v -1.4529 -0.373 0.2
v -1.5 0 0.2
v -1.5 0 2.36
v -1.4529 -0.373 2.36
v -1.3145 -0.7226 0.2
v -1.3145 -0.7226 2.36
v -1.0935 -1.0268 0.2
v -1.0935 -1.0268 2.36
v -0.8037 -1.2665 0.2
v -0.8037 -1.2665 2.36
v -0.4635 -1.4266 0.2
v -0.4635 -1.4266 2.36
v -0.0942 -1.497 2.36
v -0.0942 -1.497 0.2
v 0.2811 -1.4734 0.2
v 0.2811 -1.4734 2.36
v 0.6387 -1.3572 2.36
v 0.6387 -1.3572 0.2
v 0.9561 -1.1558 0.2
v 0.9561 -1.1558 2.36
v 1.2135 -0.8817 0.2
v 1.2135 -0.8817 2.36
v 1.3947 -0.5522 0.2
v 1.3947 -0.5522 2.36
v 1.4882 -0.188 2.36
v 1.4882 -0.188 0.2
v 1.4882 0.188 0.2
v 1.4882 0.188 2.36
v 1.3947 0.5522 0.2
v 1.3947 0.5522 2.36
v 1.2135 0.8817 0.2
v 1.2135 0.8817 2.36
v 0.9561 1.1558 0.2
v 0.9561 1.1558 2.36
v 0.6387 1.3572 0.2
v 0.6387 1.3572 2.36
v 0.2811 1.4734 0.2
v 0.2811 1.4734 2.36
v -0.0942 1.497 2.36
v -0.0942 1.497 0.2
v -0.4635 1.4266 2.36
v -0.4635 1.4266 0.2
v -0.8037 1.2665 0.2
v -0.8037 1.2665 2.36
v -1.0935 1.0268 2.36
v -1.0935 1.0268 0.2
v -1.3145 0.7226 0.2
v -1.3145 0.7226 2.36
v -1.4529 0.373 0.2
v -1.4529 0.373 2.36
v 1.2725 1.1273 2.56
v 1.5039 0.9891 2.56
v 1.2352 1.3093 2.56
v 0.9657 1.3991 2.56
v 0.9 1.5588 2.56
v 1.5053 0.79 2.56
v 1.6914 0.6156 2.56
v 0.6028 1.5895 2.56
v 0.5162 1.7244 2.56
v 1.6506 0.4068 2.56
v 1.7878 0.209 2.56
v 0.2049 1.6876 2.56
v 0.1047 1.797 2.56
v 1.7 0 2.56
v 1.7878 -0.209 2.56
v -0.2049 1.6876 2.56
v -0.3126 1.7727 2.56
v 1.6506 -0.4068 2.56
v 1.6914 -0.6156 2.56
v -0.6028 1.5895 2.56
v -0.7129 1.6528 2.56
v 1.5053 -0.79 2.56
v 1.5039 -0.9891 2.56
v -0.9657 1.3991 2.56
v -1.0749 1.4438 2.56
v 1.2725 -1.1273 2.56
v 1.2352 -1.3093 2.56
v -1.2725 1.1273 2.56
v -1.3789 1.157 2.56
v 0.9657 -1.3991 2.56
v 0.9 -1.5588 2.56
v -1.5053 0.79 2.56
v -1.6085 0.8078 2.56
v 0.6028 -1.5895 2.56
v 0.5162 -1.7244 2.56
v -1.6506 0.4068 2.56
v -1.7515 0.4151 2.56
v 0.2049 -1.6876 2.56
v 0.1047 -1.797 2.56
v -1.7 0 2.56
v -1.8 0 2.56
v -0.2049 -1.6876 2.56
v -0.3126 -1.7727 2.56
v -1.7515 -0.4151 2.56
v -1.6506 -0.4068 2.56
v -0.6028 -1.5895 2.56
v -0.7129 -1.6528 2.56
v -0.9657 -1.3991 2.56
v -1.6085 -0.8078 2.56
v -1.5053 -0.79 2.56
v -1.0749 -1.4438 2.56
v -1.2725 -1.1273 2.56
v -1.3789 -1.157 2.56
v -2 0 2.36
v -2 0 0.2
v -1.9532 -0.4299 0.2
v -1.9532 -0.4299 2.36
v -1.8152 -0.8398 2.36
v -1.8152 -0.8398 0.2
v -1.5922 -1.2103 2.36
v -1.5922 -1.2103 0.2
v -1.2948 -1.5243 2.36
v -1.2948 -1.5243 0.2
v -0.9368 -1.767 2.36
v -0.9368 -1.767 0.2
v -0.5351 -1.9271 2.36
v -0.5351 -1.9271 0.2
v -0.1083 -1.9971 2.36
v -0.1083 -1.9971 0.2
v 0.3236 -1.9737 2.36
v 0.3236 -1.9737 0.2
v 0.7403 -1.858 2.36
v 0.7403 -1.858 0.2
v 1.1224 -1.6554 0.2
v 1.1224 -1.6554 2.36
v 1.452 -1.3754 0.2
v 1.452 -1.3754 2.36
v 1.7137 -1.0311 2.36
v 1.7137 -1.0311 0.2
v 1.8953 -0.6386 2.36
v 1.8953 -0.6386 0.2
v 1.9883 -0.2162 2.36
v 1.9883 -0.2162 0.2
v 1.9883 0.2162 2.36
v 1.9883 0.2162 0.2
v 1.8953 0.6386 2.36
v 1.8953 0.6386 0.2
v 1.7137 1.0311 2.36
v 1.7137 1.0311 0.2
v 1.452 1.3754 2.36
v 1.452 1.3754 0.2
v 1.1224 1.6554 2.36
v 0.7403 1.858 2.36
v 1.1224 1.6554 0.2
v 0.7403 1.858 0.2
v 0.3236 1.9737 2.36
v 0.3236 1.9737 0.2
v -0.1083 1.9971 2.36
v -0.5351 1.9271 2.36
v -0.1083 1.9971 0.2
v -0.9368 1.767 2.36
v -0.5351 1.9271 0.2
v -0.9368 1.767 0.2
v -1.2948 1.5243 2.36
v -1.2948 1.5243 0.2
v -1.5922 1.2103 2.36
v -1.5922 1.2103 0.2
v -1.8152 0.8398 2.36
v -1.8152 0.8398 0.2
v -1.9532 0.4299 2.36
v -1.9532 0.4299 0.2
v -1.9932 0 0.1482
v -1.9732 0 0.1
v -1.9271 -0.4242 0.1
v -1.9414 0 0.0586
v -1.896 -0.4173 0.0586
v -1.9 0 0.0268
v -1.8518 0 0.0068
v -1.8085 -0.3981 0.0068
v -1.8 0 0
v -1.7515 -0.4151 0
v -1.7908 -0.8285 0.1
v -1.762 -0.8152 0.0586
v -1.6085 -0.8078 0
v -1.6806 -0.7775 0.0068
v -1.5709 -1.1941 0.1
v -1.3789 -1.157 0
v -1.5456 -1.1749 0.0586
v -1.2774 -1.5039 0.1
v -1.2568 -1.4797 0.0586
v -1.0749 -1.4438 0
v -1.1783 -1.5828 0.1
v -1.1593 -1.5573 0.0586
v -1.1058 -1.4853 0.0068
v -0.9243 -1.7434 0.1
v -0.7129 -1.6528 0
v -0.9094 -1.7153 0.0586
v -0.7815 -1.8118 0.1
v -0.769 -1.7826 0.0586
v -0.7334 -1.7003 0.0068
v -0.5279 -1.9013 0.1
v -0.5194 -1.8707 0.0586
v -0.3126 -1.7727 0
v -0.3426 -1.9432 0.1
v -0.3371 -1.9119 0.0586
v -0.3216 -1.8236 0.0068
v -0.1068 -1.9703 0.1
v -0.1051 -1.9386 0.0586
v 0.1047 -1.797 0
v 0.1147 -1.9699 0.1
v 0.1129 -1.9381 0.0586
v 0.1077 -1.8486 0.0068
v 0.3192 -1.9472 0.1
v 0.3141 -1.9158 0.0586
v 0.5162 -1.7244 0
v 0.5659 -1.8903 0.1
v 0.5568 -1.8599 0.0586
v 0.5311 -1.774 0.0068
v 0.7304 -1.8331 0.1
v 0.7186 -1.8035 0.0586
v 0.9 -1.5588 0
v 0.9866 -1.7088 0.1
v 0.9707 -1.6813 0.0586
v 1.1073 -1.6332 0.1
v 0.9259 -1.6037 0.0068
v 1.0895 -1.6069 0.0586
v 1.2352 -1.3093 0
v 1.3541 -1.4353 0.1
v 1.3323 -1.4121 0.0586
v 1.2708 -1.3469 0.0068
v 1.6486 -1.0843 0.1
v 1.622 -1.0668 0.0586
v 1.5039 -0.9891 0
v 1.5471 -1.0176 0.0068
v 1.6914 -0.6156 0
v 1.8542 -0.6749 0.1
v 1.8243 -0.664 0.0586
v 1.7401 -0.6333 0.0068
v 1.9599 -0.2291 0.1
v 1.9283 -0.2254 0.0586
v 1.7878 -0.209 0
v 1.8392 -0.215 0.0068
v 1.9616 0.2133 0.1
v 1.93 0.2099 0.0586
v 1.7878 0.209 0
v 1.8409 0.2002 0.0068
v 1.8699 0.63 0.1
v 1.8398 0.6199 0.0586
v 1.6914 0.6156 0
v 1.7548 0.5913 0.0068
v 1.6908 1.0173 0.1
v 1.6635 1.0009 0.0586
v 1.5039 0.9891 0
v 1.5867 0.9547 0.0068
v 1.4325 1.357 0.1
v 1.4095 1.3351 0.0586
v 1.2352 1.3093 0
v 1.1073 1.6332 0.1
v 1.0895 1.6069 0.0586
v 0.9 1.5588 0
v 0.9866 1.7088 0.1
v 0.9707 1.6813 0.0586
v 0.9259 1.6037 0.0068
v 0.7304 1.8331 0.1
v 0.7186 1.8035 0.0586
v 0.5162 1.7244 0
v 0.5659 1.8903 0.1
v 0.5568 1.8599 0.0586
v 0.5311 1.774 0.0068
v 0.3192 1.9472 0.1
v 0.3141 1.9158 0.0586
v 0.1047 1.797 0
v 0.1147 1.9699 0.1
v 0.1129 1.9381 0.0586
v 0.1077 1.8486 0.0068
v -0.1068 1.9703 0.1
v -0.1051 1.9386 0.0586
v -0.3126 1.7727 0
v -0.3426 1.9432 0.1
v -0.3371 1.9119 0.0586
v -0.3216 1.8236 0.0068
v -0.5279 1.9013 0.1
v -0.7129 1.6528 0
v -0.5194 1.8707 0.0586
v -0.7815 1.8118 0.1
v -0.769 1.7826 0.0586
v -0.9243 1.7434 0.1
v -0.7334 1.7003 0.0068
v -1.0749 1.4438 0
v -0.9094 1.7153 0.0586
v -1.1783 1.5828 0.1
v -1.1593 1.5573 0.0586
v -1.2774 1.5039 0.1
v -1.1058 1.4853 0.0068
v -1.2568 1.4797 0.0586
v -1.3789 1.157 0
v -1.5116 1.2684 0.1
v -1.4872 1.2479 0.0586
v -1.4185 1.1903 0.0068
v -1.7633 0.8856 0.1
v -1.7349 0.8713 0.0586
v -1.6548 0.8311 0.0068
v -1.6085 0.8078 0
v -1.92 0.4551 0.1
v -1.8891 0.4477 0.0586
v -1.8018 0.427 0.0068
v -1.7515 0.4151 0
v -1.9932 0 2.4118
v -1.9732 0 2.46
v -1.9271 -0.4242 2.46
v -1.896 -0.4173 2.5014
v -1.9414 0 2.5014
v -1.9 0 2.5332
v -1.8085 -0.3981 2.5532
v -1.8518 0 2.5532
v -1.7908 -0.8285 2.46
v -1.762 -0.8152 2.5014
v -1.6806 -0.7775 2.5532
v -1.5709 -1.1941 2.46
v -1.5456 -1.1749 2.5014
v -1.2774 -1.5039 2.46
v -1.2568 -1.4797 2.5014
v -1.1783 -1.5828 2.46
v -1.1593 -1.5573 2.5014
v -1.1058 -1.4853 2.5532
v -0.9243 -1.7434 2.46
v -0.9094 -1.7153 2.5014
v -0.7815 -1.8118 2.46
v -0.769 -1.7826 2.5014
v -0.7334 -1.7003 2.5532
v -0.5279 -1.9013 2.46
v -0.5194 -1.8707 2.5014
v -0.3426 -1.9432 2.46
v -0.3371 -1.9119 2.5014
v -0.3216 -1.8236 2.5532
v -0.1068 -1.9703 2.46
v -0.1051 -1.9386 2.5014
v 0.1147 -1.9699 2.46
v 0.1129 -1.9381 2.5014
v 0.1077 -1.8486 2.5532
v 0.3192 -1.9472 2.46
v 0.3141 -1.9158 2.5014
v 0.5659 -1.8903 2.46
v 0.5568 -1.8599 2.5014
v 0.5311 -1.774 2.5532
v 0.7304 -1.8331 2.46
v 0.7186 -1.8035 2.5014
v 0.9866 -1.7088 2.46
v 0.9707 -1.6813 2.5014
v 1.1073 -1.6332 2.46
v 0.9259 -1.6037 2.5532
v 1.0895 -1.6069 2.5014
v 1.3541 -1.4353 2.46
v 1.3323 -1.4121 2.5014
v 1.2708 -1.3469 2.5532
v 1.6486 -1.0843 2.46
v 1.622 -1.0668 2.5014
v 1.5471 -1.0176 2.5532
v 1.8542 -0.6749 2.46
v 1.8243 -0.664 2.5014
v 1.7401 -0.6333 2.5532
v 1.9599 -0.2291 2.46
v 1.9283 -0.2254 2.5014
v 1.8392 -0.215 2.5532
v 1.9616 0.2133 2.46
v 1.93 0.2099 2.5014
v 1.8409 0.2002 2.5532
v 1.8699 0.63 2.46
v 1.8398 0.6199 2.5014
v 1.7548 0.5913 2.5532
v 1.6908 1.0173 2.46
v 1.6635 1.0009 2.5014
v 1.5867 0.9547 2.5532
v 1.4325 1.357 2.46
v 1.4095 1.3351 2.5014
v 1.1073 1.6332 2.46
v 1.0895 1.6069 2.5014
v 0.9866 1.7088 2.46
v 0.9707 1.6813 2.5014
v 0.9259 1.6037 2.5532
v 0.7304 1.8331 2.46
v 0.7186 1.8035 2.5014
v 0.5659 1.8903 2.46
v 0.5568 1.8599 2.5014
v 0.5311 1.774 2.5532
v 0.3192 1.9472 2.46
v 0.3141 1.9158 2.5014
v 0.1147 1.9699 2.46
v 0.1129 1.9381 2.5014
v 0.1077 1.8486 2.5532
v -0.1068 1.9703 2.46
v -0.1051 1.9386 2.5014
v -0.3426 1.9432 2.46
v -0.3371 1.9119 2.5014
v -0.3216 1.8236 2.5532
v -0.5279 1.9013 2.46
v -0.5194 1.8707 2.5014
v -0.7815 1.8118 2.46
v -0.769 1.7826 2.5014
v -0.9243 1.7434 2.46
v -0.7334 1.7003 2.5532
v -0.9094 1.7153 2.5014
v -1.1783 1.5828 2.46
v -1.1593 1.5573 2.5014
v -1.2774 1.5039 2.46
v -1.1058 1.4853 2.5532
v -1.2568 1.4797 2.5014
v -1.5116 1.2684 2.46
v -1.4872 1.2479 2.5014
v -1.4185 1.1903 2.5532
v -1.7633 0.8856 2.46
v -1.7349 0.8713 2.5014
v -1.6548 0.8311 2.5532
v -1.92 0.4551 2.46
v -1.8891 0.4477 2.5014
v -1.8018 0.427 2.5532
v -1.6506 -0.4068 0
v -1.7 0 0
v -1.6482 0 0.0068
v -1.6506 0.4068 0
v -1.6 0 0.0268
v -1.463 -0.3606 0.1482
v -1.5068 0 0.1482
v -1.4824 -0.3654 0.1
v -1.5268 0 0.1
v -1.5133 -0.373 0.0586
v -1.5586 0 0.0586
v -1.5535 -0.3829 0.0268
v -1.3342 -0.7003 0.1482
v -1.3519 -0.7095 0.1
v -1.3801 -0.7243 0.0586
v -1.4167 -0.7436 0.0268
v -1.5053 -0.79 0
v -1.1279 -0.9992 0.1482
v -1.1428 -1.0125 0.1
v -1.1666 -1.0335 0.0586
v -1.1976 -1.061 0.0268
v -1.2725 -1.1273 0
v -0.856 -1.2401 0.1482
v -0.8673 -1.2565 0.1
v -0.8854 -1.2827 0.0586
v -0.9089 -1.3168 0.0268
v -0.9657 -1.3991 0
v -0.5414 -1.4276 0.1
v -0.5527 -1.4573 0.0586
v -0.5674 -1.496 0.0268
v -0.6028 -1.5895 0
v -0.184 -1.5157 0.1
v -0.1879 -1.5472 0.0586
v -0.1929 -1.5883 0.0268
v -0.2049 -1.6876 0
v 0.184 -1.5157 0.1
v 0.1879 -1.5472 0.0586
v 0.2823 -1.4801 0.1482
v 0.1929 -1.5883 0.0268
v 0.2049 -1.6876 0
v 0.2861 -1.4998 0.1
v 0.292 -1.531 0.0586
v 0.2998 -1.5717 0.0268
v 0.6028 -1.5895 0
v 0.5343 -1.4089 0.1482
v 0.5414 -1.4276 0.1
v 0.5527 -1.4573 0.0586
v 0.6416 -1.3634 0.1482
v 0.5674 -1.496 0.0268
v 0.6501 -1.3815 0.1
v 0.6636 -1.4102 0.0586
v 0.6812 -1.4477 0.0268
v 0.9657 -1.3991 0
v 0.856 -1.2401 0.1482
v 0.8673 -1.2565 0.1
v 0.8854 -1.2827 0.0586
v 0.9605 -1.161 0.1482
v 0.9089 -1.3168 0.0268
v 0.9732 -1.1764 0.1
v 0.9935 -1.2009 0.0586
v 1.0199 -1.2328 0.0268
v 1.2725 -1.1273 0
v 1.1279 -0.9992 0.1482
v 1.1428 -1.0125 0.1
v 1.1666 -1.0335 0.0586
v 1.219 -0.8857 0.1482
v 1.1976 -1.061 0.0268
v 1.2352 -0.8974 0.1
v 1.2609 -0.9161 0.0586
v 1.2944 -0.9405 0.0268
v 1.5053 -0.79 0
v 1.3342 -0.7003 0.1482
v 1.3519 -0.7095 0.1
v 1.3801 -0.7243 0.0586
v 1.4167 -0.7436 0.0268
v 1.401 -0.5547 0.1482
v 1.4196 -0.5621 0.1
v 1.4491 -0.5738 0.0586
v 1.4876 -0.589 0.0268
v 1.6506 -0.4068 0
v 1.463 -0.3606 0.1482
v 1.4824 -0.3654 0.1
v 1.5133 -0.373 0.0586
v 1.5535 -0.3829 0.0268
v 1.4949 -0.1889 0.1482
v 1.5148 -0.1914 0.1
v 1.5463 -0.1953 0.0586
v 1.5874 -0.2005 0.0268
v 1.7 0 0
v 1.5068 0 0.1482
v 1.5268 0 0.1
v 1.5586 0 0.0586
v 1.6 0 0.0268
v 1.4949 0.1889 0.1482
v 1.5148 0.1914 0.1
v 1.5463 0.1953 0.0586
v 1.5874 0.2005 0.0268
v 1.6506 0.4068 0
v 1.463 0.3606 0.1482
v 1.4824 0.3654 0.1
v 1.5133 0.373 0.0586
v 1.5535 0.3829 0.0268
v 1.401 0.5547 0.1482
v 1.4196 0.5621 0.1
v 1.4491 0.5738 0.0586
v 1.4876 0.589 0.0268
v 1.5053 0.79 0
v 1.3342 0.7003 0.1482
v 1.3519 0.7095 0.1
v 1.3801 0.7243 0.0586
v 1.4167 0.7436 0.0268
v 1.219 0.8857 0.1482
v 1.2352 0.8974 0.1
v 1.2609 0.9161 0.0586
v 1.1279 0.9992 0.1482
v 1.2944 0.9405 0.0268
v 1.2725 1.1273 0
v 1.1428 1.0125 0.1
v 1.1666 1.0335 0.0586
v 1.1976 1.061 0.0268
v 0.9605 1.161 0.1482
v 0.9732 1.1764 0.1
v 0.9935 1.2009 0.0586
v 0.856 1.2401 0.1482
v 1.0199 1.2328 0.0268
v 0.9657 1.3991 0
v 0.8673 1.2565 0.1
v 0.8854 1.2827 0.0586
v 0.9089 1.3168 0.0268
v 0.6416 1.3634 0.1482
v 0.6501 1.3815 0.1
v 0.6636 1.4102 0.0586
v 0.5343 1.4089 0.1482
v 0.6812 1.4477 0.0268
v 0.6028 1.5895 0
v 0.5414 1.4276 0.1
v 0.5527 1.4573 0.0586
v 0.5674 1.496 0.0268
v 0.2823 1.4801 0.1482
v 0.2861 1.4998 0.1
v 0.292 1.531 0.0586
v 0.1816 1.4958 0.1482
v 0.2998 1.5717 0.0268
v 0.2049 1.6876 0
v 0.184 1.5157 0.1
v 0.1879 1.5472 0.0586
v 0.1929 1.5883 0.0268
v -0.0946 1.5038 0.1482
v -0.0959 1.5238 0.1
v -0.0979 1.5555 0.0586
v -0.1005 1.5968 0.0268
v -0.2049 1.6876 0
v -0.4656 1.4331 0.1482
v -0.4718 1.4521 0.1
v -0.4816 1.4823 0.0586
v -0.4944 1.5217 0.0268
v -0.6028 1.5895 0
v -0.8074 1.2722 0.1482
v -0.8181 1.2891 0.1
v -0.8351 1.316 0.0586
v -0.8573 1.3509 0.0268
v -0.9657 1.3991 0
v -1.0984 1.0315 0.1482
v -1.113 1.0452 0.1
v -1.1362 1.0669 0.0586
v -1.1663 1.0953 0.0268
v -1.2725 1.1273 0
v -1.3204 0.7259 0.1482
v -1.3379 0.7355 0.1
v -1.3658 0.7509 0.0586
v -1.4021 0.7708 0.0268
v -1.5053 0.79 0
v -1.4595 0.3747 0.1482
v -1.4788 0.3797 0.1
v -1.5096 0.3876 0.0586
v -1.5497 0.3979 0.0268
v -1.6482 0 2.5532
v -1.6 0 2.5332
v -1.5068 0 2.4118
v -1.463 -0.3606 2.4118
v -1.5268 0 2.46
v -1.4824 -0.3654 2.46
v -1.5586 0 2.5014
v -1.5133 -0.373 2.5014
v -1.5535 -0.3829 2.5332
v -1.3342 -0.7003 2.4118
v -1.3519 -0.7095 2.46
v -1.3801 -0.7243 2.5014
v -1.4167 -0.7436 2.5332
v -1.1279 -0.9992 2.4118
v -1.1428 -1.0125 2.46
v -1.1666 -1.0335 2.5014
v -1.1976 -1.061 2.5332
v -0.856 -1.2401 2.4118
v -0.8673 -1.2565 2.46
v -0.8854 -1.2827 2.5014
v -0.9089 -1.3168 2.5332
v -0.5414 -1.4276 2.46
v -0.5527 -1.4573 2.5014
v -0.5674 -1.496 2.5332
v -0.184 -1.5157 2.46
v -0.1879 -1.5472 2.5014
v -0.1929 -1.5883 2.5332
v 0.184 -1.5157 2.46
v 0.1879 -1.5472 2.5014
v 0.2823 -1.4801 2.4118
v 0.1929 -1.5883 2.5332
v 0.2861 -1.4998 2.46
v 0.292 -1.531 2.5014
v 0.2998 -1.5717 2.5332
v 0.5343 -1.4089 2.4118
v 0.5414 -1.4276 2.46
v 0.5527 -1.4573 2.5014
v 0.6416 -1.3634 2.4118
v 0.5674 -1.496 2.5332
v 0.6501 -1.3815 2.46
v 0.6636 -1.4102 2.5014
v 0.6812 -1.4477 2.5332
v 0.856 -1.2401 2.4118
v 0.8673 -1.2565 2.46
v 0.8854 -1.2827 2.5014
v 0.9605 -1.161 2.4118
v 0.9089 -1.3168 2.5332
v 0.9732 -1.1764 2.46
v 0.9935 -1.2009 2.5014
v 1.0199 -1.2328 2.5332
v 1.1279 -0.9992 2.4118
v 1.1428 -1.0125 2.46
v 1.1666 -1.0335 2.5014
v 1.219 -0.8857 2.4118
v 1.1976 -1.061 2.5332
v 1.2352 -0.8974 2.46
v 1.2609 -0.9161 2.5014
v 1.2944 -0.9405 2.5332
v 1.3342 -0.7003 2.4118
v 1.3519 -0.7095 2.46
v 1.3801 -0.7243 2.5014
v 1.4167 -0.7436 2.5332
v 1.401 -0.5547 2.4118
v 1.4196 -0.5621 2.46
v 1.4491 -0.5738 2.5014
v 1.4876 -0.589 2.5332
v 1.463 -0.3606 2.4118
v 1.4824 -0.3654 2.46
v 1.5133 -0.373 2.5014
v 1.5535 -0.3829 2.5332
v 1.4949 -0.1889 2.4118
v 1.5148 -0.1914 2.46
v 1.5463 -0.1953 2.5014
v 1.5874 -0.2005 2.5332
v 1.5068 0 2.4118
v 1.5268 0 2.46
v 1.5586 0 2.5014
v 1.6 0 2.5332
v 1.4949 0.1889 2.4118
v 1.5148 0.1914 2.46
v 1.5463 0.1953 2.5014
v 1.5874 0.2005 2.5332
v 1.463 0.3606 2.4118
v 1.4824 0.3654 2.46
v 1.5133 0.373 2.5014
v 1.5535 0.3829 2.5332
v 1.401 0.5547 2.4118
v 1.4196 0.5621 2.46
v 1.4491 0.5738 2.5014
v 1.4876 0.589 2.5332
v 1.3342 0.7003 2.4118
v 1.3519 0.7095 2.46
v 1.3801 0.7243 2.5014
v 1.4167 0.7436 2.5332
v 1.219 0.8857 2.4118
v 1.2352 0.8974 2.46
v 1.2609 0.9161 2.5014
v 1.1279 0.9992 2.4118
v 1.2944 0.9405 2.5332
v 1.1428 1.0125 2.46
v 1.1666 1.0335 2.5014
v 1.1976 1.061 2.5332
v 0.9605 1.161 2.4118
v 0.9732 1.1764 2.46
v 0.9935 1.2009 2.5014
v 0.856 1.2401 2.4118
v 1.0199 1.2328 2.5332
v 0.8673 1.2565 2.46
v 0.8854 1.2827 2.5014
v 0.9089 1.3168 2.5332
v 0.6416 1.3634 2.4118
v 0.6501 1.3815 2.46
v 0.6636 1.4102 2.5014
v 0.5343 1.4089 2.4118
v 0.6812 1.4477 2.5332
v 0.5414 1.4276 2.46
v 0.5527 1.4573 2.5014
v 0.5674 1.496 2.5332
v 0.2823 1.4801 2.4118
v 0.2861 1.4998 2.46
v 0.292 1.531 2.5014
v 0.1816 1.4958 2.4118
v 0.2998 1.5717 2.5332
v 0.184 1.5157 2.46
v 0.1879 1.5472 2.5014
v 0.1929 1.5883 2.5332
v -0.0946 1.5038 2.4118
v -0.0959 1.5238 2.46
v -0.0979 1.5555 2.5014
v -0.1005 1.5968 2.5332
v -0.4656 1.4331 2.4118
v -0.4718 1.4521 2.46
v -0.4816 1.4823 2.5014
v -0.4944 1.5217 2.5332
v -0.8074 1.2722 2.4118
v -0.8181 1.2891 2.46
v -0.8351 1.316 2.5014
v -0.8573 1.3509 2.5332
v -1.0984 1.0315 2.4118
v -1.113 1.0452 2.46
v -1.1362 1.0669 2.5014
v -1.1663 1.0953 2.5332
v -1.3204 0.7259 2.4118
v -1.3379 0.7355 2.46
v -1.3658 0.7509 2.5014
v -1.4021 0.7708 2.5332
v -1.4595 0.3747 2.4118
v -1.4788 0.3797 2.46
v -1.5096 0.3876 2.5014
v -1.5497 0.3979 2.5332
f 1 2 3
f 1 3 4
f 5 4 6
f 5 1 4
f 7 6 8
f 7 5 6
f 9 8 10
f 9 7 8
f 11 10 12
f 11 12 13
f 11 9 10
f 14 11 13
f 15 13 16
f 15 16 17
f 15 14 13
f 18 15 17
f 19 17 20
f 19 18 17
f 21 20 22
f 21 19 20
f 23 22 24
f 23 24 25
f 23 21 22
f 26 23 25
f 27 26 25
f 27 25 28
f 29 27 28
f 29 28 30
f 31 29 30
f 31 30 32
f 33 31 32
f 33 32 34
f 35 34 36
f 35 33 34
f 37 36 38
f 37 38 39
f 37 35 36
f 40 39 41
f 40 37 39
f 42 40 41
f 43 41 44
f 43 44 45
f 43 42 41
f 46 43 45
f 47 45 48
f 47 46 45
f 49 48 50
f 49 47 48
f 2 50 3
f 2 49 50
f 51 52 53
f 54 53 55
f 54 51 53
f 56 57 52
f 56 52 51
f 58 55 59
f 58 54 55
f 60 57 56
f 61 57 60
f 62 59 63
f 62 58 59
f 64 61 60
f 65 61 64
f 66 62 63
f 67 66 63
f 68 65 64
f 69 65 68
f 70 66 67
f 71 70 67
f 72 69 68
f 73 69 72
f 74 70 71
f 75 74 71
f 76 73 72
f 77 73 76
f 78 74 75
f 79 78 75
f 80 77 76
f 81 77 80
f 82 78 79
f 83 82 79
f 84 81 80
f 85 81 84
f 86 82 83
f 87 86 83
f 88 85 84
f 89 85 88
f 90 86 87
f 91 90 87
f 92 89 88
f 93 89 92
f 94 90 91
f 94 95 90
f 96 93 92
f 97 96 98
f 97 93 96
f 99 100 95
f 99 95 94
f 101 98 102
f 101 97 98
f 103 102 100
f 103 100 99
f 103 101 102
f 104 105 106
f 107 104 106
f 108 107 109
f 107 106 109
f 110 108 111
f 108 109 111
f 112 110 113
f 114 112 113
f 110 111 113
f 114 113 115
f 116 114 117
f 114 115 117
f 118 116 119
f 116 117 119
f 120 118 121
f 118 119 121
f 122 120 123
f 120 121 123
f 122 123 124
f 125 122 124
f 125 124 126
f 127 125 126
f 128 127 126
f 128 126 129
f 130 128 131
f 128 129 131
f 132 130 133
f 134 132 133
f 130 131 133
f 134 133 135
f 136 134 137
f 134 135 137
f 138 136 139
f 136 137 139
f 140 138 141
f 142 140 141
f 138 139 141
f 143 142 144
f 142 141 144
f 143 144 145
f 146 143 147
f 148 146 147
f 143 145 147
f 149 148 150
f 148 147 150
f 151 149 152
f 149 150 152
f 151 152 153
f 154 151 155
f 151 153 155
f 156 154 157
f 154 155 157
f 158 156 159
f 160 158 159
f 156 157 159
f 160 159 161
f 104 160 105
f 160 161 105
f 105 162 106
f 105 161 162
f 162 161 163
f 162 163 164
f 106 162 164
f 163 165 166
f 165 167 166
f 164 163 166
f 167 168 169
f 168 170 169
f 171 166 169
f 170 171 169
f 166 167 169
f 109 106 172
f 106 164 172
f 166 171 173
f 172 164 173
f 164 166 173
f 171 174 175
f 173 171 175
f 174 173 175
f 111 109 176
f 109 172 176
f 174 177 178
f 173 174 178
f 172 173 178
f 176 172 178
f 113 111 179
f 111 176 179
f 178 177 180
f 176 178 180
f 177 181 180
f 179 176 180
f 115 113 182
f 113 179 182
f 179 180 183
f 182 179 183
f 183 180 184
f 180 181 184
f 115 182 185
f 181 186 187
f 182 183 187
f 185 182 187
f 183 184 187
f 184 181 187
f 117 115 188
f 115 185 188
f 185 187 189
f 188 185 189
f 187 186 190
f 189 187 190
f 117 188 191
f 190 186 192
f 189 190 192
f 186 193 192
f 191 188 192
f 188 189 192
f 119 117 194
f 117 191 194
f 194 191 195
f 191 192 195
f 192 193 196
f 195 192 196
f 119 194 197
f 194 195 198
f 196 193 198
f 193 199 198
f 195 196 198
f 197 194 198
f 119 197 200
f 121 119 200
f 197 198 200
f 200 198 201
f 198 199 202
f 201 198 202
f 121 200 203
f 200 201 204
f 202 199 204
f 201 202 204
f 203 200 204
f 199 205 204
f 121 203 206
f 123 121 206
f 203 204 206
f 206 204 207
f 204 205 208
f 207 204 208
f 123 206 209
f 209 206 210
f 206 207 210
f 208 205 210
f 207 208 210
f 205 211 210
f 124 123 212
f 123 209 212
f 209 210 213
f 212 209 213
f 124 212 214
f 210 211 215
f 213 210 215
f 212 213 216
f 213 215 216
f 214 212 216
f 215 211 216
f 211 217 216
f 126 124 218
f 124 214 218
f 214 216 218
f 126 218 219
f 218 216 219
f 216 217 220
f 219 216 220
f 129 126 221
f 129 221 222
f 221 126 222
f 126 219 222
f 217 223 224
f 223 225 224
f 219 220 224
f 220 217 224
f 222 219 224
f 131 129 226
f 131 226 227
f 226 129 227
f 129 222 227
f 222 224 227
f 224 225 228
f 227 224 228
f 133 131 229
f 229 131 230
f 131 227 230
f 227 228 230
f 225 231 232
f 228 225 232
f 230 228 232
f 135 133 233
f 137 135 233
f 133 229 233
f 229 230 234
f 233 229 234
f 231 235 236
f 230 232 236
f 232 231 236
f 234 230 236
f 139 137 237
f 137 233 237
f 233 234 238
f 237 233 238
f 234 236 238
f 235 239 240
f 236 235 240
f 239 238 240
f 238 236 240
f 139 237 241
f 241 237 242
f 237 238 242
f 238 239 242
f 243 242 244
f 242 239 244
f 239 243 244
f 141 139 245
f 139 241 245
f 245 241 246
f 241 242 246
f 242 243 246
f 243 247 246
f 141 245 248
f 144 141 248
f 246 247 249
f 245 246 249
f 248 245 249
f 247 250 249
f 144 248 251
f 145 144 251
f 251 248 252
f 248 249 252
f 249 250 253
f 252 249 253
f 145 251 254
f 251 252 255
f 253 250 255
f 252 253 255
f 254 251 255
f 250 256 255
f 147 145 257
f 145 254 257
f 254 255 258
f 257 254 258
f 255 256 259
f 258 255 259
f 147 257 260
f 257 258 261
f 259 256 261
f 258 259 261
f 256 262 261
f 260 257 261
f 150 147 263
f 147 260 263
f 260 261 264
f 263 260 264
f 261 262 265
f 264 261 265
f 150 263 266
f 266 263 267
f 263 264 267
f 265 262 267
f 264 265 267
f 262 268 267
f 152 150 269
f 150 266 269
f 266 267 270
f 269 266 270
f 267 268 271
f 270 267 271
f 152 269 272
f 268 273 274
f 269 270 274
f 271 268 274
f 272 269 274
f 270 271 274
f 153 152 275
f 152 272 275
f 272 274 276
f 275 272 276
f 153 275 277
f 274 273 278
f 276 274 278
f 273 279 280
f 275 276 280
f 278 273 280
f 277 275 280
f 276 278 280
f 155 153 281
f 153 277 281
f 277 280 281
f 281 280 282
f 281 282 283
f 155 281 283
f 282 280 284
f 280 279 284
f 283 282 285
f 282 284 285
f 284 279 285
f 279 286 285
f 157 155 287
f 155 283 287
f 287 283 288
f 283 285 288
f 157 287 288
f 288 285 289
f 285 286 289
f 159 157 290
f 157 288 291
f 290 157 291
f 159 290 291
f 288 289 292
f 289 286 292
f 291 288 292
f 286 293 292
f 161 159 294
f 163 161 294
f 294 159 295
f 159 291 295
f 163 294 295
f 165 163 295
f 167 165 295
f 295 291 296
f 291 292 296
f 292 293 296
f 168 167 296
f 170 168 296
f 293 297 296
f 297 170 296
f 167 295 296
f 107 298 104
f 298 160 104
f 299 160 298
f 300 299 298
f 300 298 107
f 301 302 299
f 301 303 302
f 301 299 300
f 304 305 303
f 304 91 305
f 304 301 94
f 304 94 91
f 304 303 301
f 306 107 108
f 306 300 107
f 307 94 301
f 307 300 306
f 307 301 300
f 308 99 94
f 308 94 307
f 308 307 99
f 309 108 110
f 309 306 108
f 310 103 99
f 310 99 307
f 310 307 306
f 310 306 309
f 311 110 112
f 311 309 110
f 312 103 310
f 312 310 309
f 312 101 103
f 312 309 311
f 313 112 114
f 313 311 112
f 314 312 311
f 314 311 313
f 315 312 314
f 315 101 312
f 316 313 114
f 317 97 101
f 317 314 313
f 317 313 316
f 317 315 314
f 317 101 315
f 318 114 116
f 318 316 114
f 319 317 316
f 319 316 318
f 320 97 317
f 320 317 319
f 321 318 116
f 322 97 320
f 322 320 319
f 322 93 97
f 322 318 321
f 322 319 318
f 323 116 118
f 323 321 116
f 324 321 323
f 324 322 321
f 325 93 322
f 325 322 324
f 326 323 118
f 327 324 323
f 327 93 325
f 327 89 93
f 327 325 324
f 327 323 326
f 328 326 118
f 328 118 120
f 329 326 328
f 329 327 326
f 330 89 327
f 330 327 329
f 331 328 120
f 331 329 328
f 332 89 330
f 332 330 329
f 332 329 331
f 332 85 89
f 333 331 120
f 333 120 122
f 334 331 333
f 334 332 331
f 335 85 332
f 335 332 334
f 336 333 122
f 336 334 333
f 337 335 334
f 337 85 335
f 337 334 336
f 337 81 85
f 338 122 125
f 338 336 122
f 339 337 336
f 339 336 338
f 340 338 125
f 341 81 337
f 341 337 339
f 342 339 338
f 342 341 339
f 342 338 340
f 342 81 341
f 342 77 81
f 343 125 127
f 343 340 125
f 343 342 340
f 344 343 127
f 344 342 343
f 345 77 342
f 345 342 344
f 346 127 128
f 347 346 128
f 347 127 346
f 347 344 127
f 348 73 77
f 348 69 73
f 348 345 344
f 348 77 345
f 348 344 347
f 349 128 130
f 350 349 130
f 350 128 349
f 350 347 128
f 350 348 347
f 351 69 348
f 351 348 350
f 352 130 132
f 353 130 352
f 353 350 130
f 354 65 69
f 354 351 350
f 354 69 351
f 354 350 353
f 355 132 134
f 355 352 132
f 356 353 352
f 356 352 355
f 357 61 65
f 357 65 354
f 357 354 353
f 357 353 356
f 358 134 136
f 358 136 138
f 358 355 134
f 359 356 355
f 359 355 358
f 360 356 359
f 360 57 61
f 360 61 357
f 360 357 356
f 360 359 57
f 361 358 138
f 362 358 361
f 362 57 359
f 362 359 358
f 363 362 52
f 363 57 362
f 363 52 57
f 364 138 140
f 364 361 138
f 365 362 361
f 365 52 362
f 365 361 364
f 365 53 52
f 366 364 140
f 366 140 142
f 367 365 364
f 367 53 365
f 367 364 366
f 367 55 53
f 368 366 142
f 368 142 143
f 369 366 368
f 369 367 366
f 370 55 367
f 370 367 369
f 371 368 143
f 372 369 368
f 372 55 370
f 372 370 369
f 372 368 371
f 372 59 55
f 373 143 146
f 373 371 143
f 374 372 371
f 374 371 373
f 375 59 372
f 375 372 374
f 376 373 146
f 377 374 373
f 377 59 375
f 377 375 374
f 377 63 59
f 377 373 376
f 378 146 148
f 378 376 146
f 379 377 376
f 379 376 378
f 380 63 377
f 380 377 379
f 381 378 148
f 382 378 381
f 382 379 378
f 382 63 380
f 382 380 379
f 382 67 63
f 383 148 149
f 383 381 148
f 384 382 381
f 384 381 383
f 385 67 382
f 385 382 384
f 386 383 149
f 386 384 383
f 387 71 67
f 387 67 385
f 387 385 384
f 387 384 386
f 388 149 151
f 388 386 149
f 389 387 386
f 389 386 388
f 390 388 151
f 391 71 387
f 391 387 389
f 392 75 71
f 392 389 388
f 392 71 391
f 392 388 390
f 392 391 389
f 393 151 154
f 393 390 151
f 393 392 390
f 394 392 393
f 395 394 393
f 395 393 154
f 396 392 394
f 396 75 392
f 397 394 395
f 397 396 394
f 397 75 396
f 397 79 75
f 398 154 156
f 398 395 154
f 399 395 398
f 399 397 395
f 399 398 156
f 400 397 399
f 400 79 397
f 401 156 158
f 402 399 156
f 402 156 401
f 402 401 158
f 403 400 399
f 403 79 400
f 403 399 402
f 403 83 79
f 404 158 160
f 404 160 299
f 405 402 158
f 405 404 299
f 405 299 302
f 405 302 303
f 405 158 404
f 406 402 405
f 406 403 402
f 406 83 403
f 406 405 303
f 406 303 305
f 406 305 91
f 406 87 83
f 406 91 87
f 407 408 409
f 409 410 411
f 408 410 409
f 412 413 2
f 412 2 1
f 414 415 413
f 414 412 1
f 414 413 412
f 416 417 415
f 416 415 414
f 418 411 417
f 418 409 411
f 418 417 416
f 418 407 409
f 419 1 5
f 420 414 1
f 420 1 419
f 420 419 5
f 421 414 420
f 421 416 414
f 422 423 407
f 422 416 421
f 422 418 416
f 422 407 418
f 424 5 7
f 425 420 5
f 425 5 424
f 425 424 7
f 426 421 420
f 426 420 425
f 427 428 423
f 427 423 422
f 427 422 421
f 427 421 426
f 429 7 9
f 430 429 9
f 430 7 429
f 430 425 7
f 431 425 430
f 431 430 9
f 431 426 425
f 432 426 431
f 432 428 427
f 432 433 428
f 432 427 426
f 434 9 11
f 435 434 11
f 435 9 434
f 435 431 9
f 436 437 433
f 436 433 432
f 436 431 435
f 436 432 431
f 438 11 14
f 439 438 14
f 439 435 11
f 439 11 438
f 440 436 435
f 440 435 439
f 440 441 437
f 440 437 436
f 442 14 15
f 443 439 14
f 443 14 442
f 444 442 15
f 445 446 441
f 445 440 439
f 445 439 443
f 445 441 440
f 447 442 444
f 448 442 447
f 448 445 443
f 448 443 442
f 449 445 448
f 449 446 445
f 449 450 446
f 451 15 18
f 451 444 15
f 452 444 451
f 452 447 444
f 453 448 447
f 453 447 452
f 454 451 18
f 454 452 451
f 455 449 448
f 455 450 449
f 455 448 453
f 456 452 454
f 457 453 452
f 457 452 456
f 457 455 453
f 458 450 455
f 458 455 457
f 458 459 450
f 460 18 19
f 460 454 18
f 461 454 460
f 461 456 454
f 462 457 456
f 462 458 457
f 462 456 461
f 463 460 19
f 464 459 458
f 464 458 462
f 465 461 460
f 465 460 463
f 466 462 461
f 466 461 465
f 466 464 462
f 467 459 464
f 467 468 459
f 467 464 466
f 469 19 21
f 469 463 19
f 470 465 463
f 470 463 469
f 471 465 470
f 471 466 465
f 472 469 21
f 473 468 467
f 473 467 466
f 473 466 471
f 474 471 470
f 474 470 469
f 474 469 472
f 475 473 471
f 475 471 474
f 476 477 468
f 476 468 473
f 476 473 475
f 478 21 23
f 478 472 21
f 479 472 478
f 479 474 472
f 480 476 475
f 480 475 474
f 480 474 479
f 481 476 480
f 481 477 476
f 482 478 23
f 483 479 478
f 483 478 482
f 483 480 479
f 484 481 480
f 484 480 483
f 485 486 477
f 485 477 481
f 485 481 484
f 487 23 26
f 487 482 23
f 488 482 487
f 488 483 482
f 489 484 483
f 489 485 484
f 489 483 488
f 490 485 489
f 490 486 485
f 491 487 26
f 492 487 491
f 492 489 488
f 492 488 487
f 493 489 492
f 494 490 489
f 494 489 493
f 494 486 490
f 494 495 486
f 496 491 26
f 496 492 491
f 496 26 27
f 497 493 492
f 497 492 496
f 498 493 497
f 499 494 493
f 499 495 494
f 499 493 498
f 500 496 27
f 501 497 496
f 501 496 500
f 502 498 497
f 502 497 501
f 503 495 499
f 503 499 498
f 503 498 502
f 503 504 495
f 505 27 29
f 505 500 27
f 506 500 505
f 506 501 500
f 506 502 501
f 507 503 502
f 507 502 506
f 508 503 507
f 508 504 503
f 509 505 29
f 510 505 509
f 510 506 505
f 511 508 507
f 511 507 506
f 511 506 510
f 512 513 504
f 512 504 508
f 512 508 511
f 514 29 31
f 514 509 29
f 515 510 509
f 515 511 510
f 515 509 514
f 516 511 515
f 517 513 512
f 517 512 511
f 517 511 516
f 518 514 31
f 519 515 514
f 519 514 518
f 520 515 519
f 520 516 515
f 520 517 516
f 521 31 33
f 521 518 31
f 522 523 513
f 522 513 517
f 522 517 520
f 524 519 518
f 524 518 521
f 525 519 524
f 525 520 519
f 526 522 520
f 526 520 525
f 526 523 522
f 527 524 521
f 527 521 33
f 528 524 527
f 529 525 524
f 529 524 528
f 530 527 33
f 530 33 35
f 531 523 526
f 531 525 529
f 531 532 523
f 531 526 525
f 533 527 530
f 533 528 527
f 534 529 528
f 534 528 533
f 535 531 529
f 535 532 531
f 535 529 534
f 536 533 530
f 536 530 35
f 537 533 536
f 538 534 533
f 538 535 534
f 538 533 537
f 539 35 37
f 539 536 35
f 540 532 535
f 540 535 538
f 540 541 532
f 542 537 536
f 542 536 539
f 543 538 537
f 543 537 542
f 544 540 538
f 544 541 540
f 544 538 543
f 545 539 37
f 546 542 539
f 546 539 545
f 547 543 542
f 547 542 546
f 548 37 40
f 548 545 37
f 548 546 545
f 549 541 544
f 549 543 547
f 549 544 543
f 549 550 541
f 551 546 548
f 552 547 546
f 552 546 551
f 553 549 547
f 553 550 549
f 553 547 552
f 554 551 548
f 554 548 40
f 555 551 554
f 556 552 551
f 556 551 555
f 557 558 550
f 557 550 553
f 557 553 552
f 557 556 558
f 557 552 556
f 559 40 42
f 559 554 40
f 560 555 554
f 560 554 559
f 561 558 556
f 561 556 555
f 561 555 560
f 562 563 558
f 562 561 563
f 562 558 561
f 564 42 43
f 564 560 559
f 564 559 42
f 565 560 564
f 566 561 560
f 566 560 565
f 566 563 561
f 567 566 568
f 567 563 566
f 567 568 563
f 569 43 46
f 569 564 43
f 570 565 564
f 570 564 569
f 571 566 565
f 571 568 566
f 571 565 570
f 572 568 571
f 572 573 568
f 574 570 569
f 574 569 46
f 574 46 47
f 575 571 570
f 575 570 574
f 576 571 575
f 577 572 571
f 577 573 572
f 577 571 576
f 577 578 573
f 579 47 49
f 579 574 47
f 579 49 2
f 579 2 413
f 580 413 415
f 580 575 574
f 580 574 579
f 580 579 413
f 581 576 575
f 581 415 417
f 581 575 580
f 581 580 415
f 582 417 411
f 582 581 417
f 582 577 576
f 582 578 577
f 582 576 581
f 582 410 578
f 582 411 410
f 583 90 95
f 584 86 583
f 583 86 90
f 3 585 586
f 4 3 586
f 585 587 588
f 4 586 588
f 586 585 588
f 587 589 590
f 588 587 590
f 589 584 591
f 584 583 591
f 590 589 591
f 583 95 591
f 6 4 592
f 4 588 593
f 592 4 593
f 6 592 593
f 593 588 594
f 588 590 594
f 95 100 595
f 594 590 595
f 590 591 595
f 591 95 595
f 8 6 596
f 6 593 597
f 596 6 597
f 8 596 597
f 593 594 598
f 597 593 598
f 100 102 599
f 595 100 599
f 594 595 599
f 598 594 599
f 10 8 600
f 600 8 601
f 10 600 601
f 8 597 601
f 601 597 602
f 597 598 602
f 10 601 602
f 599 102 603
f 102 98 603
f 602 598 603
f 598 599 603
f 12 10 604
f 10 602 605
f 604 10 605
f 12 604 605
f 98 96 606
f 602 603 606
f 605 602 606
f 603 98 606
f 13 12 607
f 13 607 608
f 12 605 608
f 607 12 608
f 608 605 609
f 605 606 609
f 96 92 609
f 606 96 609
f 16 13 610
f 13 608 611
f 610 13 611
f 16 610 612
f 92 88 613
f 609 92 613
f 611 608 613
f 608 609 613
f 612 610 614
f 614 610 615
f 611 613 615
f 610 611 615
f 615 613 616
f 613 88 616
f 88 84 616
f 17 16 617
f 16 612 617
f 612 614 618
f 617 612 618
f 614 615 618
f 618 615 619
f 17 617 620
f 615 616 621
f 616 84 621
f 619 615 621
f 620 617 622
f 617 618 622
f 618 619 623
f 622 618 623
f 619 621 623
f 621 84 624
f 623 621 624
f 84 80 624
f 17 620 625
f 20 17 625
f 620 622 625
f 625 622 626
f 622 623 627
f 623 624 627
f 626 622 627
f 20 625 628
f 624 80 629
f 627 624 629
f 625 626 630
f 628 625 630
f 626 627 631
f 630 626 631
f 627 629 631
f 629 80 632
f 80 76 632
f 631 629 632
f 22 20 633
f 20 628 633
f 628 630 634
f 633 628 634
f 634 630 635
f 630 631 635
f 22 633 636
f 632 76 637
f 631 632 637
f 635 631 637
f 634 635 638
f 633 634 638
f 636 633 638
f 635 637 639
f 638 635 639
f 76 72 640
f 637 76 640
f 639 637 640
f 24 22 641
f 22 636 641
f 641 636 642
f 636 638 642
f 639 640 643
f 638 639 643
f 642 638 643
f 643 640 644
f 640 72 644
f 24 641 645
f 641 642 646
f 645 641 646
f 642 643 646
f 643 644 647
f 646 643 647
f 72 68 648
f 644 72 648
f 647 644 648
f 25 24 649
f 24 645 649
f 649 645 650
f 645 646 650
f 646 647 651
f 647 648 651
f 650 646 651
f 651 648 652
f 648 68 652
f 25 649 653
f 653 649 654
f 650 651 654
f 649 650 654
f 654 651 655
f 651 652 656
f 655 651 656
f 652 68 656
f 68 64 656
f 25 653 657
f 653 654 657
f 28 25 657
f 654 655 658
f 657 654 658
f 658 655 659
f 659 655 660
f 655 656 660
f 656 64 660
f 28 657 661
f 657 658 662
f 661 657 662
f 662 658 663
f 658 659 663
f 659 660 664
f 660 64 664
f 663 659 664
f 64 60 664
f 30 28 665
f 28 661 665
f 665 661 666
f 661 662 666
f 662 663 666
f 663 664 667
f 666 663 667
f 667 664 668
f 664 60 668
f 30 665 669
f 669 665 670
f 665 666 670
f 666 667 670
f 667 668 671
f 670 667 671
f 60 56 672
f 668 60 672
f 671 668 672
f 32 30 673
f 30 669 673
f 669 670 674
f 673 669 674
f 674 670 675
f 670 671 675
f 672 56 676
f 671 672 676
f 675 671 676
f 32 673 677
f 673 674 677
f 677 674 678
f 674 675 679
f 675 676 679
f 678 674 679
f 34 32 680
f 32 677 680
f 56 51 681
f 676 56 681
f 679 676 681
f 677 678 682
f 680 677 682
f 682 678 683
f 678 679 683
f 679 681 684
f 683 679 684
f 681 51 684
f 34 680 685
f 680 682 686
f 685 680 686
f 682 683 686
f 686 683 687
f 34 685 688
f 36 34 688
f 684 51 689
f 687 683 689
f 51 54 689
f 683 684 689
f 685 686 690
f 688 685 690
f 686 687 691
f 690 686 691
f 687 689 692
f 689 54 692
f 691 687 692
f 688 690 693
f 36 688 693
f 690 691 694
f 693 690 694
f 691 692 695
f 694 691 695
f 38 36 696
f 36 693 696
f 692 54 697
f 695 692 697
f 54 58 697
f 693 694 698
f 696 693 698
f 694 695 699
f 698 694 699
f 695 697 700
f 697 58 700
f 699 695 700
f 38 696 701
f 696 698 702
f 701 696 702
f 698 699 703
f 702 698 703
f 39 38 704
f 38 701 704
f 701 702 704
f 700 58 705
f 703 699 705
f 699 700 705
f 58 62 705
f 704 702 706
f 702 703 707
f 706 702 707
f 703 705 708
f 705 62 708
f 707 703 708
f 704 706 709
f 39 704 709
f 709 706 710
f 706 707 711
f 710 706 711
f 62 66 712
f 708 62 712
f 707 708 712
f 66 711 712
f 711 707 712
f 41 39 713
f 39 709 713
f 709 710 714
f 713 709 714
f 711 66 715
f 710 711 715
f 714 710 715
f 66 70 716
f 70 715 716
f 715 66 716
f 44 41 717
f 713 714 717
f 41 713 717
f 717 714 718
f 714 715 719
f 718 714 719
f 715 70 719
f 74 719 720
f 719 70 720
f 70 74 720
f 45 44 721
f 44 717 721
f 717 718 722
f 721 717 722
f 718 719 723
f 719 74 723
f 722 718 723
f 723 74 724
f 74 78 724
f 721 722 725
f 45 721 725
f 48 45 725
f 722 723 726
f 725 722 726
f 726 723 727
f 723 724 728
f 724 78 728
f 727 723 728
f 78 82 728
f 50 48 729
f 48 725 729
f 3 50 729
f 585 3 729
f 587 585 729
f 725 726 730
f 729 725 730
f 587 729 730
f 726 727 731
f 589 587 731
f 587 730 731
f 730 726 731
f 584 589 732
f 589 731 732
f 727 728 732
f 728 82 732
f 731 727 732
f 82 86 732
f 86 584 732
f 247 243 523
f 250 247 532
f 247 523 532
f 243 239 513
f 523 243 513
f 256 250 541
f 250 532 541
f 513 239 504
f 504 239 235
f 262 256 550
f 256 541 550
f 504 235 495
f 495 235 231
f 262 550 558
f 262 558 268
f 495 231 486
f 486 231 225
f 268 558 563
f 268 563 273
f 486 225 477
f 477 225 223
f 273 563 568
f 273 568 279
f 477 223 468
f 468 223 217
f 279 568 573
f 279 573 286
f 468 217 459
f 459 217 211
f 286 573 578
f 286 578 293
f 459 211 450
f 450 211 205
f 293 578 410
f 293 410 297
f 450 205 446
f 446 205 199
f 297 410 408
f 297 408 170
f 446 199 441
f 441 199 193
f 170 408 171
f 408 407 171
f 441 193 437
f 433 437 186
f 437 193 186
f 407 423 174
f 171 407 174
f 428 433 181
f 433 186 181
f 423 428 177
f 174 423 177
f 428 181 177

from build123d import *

# Parameters (mm, degrees)
ESQUISSE1_R        = 2
ESQUISSE1_R_2      = 1.5
BOSS_EXTRU_1_DEPTH = 2.56
CONG_1_R           = 0.2


with BuildPart() as part:
    # Esquisse1 → Boss.-Extru.1 (new body)
    with BuildSketch(Plane.XY):
        with Locations(Location((0, 0, 0), (0, 0, 180))):
            Circle(ESQUISSE1_R)
        with Locations(Location((0, 0, 0), (0, 0, 180))):
            Circle(ESQUISSE1_R_2, mode=Mode.SUBTRACT)
    extrude(amount=BOSS_EXTRU_1_DEPTH)

    # Congé1
    cong_1_edges = [part.edges().sort_by_distance(p)[0] for p in [
        (2, 0, 0),
        (2, 0, 2.56),
        (1.5, 0, 0),
        (1.5, 0, 2.56),
    ]]
    fillet(cong_1_edges, radius=CONG_1_R)


solid = part.part
